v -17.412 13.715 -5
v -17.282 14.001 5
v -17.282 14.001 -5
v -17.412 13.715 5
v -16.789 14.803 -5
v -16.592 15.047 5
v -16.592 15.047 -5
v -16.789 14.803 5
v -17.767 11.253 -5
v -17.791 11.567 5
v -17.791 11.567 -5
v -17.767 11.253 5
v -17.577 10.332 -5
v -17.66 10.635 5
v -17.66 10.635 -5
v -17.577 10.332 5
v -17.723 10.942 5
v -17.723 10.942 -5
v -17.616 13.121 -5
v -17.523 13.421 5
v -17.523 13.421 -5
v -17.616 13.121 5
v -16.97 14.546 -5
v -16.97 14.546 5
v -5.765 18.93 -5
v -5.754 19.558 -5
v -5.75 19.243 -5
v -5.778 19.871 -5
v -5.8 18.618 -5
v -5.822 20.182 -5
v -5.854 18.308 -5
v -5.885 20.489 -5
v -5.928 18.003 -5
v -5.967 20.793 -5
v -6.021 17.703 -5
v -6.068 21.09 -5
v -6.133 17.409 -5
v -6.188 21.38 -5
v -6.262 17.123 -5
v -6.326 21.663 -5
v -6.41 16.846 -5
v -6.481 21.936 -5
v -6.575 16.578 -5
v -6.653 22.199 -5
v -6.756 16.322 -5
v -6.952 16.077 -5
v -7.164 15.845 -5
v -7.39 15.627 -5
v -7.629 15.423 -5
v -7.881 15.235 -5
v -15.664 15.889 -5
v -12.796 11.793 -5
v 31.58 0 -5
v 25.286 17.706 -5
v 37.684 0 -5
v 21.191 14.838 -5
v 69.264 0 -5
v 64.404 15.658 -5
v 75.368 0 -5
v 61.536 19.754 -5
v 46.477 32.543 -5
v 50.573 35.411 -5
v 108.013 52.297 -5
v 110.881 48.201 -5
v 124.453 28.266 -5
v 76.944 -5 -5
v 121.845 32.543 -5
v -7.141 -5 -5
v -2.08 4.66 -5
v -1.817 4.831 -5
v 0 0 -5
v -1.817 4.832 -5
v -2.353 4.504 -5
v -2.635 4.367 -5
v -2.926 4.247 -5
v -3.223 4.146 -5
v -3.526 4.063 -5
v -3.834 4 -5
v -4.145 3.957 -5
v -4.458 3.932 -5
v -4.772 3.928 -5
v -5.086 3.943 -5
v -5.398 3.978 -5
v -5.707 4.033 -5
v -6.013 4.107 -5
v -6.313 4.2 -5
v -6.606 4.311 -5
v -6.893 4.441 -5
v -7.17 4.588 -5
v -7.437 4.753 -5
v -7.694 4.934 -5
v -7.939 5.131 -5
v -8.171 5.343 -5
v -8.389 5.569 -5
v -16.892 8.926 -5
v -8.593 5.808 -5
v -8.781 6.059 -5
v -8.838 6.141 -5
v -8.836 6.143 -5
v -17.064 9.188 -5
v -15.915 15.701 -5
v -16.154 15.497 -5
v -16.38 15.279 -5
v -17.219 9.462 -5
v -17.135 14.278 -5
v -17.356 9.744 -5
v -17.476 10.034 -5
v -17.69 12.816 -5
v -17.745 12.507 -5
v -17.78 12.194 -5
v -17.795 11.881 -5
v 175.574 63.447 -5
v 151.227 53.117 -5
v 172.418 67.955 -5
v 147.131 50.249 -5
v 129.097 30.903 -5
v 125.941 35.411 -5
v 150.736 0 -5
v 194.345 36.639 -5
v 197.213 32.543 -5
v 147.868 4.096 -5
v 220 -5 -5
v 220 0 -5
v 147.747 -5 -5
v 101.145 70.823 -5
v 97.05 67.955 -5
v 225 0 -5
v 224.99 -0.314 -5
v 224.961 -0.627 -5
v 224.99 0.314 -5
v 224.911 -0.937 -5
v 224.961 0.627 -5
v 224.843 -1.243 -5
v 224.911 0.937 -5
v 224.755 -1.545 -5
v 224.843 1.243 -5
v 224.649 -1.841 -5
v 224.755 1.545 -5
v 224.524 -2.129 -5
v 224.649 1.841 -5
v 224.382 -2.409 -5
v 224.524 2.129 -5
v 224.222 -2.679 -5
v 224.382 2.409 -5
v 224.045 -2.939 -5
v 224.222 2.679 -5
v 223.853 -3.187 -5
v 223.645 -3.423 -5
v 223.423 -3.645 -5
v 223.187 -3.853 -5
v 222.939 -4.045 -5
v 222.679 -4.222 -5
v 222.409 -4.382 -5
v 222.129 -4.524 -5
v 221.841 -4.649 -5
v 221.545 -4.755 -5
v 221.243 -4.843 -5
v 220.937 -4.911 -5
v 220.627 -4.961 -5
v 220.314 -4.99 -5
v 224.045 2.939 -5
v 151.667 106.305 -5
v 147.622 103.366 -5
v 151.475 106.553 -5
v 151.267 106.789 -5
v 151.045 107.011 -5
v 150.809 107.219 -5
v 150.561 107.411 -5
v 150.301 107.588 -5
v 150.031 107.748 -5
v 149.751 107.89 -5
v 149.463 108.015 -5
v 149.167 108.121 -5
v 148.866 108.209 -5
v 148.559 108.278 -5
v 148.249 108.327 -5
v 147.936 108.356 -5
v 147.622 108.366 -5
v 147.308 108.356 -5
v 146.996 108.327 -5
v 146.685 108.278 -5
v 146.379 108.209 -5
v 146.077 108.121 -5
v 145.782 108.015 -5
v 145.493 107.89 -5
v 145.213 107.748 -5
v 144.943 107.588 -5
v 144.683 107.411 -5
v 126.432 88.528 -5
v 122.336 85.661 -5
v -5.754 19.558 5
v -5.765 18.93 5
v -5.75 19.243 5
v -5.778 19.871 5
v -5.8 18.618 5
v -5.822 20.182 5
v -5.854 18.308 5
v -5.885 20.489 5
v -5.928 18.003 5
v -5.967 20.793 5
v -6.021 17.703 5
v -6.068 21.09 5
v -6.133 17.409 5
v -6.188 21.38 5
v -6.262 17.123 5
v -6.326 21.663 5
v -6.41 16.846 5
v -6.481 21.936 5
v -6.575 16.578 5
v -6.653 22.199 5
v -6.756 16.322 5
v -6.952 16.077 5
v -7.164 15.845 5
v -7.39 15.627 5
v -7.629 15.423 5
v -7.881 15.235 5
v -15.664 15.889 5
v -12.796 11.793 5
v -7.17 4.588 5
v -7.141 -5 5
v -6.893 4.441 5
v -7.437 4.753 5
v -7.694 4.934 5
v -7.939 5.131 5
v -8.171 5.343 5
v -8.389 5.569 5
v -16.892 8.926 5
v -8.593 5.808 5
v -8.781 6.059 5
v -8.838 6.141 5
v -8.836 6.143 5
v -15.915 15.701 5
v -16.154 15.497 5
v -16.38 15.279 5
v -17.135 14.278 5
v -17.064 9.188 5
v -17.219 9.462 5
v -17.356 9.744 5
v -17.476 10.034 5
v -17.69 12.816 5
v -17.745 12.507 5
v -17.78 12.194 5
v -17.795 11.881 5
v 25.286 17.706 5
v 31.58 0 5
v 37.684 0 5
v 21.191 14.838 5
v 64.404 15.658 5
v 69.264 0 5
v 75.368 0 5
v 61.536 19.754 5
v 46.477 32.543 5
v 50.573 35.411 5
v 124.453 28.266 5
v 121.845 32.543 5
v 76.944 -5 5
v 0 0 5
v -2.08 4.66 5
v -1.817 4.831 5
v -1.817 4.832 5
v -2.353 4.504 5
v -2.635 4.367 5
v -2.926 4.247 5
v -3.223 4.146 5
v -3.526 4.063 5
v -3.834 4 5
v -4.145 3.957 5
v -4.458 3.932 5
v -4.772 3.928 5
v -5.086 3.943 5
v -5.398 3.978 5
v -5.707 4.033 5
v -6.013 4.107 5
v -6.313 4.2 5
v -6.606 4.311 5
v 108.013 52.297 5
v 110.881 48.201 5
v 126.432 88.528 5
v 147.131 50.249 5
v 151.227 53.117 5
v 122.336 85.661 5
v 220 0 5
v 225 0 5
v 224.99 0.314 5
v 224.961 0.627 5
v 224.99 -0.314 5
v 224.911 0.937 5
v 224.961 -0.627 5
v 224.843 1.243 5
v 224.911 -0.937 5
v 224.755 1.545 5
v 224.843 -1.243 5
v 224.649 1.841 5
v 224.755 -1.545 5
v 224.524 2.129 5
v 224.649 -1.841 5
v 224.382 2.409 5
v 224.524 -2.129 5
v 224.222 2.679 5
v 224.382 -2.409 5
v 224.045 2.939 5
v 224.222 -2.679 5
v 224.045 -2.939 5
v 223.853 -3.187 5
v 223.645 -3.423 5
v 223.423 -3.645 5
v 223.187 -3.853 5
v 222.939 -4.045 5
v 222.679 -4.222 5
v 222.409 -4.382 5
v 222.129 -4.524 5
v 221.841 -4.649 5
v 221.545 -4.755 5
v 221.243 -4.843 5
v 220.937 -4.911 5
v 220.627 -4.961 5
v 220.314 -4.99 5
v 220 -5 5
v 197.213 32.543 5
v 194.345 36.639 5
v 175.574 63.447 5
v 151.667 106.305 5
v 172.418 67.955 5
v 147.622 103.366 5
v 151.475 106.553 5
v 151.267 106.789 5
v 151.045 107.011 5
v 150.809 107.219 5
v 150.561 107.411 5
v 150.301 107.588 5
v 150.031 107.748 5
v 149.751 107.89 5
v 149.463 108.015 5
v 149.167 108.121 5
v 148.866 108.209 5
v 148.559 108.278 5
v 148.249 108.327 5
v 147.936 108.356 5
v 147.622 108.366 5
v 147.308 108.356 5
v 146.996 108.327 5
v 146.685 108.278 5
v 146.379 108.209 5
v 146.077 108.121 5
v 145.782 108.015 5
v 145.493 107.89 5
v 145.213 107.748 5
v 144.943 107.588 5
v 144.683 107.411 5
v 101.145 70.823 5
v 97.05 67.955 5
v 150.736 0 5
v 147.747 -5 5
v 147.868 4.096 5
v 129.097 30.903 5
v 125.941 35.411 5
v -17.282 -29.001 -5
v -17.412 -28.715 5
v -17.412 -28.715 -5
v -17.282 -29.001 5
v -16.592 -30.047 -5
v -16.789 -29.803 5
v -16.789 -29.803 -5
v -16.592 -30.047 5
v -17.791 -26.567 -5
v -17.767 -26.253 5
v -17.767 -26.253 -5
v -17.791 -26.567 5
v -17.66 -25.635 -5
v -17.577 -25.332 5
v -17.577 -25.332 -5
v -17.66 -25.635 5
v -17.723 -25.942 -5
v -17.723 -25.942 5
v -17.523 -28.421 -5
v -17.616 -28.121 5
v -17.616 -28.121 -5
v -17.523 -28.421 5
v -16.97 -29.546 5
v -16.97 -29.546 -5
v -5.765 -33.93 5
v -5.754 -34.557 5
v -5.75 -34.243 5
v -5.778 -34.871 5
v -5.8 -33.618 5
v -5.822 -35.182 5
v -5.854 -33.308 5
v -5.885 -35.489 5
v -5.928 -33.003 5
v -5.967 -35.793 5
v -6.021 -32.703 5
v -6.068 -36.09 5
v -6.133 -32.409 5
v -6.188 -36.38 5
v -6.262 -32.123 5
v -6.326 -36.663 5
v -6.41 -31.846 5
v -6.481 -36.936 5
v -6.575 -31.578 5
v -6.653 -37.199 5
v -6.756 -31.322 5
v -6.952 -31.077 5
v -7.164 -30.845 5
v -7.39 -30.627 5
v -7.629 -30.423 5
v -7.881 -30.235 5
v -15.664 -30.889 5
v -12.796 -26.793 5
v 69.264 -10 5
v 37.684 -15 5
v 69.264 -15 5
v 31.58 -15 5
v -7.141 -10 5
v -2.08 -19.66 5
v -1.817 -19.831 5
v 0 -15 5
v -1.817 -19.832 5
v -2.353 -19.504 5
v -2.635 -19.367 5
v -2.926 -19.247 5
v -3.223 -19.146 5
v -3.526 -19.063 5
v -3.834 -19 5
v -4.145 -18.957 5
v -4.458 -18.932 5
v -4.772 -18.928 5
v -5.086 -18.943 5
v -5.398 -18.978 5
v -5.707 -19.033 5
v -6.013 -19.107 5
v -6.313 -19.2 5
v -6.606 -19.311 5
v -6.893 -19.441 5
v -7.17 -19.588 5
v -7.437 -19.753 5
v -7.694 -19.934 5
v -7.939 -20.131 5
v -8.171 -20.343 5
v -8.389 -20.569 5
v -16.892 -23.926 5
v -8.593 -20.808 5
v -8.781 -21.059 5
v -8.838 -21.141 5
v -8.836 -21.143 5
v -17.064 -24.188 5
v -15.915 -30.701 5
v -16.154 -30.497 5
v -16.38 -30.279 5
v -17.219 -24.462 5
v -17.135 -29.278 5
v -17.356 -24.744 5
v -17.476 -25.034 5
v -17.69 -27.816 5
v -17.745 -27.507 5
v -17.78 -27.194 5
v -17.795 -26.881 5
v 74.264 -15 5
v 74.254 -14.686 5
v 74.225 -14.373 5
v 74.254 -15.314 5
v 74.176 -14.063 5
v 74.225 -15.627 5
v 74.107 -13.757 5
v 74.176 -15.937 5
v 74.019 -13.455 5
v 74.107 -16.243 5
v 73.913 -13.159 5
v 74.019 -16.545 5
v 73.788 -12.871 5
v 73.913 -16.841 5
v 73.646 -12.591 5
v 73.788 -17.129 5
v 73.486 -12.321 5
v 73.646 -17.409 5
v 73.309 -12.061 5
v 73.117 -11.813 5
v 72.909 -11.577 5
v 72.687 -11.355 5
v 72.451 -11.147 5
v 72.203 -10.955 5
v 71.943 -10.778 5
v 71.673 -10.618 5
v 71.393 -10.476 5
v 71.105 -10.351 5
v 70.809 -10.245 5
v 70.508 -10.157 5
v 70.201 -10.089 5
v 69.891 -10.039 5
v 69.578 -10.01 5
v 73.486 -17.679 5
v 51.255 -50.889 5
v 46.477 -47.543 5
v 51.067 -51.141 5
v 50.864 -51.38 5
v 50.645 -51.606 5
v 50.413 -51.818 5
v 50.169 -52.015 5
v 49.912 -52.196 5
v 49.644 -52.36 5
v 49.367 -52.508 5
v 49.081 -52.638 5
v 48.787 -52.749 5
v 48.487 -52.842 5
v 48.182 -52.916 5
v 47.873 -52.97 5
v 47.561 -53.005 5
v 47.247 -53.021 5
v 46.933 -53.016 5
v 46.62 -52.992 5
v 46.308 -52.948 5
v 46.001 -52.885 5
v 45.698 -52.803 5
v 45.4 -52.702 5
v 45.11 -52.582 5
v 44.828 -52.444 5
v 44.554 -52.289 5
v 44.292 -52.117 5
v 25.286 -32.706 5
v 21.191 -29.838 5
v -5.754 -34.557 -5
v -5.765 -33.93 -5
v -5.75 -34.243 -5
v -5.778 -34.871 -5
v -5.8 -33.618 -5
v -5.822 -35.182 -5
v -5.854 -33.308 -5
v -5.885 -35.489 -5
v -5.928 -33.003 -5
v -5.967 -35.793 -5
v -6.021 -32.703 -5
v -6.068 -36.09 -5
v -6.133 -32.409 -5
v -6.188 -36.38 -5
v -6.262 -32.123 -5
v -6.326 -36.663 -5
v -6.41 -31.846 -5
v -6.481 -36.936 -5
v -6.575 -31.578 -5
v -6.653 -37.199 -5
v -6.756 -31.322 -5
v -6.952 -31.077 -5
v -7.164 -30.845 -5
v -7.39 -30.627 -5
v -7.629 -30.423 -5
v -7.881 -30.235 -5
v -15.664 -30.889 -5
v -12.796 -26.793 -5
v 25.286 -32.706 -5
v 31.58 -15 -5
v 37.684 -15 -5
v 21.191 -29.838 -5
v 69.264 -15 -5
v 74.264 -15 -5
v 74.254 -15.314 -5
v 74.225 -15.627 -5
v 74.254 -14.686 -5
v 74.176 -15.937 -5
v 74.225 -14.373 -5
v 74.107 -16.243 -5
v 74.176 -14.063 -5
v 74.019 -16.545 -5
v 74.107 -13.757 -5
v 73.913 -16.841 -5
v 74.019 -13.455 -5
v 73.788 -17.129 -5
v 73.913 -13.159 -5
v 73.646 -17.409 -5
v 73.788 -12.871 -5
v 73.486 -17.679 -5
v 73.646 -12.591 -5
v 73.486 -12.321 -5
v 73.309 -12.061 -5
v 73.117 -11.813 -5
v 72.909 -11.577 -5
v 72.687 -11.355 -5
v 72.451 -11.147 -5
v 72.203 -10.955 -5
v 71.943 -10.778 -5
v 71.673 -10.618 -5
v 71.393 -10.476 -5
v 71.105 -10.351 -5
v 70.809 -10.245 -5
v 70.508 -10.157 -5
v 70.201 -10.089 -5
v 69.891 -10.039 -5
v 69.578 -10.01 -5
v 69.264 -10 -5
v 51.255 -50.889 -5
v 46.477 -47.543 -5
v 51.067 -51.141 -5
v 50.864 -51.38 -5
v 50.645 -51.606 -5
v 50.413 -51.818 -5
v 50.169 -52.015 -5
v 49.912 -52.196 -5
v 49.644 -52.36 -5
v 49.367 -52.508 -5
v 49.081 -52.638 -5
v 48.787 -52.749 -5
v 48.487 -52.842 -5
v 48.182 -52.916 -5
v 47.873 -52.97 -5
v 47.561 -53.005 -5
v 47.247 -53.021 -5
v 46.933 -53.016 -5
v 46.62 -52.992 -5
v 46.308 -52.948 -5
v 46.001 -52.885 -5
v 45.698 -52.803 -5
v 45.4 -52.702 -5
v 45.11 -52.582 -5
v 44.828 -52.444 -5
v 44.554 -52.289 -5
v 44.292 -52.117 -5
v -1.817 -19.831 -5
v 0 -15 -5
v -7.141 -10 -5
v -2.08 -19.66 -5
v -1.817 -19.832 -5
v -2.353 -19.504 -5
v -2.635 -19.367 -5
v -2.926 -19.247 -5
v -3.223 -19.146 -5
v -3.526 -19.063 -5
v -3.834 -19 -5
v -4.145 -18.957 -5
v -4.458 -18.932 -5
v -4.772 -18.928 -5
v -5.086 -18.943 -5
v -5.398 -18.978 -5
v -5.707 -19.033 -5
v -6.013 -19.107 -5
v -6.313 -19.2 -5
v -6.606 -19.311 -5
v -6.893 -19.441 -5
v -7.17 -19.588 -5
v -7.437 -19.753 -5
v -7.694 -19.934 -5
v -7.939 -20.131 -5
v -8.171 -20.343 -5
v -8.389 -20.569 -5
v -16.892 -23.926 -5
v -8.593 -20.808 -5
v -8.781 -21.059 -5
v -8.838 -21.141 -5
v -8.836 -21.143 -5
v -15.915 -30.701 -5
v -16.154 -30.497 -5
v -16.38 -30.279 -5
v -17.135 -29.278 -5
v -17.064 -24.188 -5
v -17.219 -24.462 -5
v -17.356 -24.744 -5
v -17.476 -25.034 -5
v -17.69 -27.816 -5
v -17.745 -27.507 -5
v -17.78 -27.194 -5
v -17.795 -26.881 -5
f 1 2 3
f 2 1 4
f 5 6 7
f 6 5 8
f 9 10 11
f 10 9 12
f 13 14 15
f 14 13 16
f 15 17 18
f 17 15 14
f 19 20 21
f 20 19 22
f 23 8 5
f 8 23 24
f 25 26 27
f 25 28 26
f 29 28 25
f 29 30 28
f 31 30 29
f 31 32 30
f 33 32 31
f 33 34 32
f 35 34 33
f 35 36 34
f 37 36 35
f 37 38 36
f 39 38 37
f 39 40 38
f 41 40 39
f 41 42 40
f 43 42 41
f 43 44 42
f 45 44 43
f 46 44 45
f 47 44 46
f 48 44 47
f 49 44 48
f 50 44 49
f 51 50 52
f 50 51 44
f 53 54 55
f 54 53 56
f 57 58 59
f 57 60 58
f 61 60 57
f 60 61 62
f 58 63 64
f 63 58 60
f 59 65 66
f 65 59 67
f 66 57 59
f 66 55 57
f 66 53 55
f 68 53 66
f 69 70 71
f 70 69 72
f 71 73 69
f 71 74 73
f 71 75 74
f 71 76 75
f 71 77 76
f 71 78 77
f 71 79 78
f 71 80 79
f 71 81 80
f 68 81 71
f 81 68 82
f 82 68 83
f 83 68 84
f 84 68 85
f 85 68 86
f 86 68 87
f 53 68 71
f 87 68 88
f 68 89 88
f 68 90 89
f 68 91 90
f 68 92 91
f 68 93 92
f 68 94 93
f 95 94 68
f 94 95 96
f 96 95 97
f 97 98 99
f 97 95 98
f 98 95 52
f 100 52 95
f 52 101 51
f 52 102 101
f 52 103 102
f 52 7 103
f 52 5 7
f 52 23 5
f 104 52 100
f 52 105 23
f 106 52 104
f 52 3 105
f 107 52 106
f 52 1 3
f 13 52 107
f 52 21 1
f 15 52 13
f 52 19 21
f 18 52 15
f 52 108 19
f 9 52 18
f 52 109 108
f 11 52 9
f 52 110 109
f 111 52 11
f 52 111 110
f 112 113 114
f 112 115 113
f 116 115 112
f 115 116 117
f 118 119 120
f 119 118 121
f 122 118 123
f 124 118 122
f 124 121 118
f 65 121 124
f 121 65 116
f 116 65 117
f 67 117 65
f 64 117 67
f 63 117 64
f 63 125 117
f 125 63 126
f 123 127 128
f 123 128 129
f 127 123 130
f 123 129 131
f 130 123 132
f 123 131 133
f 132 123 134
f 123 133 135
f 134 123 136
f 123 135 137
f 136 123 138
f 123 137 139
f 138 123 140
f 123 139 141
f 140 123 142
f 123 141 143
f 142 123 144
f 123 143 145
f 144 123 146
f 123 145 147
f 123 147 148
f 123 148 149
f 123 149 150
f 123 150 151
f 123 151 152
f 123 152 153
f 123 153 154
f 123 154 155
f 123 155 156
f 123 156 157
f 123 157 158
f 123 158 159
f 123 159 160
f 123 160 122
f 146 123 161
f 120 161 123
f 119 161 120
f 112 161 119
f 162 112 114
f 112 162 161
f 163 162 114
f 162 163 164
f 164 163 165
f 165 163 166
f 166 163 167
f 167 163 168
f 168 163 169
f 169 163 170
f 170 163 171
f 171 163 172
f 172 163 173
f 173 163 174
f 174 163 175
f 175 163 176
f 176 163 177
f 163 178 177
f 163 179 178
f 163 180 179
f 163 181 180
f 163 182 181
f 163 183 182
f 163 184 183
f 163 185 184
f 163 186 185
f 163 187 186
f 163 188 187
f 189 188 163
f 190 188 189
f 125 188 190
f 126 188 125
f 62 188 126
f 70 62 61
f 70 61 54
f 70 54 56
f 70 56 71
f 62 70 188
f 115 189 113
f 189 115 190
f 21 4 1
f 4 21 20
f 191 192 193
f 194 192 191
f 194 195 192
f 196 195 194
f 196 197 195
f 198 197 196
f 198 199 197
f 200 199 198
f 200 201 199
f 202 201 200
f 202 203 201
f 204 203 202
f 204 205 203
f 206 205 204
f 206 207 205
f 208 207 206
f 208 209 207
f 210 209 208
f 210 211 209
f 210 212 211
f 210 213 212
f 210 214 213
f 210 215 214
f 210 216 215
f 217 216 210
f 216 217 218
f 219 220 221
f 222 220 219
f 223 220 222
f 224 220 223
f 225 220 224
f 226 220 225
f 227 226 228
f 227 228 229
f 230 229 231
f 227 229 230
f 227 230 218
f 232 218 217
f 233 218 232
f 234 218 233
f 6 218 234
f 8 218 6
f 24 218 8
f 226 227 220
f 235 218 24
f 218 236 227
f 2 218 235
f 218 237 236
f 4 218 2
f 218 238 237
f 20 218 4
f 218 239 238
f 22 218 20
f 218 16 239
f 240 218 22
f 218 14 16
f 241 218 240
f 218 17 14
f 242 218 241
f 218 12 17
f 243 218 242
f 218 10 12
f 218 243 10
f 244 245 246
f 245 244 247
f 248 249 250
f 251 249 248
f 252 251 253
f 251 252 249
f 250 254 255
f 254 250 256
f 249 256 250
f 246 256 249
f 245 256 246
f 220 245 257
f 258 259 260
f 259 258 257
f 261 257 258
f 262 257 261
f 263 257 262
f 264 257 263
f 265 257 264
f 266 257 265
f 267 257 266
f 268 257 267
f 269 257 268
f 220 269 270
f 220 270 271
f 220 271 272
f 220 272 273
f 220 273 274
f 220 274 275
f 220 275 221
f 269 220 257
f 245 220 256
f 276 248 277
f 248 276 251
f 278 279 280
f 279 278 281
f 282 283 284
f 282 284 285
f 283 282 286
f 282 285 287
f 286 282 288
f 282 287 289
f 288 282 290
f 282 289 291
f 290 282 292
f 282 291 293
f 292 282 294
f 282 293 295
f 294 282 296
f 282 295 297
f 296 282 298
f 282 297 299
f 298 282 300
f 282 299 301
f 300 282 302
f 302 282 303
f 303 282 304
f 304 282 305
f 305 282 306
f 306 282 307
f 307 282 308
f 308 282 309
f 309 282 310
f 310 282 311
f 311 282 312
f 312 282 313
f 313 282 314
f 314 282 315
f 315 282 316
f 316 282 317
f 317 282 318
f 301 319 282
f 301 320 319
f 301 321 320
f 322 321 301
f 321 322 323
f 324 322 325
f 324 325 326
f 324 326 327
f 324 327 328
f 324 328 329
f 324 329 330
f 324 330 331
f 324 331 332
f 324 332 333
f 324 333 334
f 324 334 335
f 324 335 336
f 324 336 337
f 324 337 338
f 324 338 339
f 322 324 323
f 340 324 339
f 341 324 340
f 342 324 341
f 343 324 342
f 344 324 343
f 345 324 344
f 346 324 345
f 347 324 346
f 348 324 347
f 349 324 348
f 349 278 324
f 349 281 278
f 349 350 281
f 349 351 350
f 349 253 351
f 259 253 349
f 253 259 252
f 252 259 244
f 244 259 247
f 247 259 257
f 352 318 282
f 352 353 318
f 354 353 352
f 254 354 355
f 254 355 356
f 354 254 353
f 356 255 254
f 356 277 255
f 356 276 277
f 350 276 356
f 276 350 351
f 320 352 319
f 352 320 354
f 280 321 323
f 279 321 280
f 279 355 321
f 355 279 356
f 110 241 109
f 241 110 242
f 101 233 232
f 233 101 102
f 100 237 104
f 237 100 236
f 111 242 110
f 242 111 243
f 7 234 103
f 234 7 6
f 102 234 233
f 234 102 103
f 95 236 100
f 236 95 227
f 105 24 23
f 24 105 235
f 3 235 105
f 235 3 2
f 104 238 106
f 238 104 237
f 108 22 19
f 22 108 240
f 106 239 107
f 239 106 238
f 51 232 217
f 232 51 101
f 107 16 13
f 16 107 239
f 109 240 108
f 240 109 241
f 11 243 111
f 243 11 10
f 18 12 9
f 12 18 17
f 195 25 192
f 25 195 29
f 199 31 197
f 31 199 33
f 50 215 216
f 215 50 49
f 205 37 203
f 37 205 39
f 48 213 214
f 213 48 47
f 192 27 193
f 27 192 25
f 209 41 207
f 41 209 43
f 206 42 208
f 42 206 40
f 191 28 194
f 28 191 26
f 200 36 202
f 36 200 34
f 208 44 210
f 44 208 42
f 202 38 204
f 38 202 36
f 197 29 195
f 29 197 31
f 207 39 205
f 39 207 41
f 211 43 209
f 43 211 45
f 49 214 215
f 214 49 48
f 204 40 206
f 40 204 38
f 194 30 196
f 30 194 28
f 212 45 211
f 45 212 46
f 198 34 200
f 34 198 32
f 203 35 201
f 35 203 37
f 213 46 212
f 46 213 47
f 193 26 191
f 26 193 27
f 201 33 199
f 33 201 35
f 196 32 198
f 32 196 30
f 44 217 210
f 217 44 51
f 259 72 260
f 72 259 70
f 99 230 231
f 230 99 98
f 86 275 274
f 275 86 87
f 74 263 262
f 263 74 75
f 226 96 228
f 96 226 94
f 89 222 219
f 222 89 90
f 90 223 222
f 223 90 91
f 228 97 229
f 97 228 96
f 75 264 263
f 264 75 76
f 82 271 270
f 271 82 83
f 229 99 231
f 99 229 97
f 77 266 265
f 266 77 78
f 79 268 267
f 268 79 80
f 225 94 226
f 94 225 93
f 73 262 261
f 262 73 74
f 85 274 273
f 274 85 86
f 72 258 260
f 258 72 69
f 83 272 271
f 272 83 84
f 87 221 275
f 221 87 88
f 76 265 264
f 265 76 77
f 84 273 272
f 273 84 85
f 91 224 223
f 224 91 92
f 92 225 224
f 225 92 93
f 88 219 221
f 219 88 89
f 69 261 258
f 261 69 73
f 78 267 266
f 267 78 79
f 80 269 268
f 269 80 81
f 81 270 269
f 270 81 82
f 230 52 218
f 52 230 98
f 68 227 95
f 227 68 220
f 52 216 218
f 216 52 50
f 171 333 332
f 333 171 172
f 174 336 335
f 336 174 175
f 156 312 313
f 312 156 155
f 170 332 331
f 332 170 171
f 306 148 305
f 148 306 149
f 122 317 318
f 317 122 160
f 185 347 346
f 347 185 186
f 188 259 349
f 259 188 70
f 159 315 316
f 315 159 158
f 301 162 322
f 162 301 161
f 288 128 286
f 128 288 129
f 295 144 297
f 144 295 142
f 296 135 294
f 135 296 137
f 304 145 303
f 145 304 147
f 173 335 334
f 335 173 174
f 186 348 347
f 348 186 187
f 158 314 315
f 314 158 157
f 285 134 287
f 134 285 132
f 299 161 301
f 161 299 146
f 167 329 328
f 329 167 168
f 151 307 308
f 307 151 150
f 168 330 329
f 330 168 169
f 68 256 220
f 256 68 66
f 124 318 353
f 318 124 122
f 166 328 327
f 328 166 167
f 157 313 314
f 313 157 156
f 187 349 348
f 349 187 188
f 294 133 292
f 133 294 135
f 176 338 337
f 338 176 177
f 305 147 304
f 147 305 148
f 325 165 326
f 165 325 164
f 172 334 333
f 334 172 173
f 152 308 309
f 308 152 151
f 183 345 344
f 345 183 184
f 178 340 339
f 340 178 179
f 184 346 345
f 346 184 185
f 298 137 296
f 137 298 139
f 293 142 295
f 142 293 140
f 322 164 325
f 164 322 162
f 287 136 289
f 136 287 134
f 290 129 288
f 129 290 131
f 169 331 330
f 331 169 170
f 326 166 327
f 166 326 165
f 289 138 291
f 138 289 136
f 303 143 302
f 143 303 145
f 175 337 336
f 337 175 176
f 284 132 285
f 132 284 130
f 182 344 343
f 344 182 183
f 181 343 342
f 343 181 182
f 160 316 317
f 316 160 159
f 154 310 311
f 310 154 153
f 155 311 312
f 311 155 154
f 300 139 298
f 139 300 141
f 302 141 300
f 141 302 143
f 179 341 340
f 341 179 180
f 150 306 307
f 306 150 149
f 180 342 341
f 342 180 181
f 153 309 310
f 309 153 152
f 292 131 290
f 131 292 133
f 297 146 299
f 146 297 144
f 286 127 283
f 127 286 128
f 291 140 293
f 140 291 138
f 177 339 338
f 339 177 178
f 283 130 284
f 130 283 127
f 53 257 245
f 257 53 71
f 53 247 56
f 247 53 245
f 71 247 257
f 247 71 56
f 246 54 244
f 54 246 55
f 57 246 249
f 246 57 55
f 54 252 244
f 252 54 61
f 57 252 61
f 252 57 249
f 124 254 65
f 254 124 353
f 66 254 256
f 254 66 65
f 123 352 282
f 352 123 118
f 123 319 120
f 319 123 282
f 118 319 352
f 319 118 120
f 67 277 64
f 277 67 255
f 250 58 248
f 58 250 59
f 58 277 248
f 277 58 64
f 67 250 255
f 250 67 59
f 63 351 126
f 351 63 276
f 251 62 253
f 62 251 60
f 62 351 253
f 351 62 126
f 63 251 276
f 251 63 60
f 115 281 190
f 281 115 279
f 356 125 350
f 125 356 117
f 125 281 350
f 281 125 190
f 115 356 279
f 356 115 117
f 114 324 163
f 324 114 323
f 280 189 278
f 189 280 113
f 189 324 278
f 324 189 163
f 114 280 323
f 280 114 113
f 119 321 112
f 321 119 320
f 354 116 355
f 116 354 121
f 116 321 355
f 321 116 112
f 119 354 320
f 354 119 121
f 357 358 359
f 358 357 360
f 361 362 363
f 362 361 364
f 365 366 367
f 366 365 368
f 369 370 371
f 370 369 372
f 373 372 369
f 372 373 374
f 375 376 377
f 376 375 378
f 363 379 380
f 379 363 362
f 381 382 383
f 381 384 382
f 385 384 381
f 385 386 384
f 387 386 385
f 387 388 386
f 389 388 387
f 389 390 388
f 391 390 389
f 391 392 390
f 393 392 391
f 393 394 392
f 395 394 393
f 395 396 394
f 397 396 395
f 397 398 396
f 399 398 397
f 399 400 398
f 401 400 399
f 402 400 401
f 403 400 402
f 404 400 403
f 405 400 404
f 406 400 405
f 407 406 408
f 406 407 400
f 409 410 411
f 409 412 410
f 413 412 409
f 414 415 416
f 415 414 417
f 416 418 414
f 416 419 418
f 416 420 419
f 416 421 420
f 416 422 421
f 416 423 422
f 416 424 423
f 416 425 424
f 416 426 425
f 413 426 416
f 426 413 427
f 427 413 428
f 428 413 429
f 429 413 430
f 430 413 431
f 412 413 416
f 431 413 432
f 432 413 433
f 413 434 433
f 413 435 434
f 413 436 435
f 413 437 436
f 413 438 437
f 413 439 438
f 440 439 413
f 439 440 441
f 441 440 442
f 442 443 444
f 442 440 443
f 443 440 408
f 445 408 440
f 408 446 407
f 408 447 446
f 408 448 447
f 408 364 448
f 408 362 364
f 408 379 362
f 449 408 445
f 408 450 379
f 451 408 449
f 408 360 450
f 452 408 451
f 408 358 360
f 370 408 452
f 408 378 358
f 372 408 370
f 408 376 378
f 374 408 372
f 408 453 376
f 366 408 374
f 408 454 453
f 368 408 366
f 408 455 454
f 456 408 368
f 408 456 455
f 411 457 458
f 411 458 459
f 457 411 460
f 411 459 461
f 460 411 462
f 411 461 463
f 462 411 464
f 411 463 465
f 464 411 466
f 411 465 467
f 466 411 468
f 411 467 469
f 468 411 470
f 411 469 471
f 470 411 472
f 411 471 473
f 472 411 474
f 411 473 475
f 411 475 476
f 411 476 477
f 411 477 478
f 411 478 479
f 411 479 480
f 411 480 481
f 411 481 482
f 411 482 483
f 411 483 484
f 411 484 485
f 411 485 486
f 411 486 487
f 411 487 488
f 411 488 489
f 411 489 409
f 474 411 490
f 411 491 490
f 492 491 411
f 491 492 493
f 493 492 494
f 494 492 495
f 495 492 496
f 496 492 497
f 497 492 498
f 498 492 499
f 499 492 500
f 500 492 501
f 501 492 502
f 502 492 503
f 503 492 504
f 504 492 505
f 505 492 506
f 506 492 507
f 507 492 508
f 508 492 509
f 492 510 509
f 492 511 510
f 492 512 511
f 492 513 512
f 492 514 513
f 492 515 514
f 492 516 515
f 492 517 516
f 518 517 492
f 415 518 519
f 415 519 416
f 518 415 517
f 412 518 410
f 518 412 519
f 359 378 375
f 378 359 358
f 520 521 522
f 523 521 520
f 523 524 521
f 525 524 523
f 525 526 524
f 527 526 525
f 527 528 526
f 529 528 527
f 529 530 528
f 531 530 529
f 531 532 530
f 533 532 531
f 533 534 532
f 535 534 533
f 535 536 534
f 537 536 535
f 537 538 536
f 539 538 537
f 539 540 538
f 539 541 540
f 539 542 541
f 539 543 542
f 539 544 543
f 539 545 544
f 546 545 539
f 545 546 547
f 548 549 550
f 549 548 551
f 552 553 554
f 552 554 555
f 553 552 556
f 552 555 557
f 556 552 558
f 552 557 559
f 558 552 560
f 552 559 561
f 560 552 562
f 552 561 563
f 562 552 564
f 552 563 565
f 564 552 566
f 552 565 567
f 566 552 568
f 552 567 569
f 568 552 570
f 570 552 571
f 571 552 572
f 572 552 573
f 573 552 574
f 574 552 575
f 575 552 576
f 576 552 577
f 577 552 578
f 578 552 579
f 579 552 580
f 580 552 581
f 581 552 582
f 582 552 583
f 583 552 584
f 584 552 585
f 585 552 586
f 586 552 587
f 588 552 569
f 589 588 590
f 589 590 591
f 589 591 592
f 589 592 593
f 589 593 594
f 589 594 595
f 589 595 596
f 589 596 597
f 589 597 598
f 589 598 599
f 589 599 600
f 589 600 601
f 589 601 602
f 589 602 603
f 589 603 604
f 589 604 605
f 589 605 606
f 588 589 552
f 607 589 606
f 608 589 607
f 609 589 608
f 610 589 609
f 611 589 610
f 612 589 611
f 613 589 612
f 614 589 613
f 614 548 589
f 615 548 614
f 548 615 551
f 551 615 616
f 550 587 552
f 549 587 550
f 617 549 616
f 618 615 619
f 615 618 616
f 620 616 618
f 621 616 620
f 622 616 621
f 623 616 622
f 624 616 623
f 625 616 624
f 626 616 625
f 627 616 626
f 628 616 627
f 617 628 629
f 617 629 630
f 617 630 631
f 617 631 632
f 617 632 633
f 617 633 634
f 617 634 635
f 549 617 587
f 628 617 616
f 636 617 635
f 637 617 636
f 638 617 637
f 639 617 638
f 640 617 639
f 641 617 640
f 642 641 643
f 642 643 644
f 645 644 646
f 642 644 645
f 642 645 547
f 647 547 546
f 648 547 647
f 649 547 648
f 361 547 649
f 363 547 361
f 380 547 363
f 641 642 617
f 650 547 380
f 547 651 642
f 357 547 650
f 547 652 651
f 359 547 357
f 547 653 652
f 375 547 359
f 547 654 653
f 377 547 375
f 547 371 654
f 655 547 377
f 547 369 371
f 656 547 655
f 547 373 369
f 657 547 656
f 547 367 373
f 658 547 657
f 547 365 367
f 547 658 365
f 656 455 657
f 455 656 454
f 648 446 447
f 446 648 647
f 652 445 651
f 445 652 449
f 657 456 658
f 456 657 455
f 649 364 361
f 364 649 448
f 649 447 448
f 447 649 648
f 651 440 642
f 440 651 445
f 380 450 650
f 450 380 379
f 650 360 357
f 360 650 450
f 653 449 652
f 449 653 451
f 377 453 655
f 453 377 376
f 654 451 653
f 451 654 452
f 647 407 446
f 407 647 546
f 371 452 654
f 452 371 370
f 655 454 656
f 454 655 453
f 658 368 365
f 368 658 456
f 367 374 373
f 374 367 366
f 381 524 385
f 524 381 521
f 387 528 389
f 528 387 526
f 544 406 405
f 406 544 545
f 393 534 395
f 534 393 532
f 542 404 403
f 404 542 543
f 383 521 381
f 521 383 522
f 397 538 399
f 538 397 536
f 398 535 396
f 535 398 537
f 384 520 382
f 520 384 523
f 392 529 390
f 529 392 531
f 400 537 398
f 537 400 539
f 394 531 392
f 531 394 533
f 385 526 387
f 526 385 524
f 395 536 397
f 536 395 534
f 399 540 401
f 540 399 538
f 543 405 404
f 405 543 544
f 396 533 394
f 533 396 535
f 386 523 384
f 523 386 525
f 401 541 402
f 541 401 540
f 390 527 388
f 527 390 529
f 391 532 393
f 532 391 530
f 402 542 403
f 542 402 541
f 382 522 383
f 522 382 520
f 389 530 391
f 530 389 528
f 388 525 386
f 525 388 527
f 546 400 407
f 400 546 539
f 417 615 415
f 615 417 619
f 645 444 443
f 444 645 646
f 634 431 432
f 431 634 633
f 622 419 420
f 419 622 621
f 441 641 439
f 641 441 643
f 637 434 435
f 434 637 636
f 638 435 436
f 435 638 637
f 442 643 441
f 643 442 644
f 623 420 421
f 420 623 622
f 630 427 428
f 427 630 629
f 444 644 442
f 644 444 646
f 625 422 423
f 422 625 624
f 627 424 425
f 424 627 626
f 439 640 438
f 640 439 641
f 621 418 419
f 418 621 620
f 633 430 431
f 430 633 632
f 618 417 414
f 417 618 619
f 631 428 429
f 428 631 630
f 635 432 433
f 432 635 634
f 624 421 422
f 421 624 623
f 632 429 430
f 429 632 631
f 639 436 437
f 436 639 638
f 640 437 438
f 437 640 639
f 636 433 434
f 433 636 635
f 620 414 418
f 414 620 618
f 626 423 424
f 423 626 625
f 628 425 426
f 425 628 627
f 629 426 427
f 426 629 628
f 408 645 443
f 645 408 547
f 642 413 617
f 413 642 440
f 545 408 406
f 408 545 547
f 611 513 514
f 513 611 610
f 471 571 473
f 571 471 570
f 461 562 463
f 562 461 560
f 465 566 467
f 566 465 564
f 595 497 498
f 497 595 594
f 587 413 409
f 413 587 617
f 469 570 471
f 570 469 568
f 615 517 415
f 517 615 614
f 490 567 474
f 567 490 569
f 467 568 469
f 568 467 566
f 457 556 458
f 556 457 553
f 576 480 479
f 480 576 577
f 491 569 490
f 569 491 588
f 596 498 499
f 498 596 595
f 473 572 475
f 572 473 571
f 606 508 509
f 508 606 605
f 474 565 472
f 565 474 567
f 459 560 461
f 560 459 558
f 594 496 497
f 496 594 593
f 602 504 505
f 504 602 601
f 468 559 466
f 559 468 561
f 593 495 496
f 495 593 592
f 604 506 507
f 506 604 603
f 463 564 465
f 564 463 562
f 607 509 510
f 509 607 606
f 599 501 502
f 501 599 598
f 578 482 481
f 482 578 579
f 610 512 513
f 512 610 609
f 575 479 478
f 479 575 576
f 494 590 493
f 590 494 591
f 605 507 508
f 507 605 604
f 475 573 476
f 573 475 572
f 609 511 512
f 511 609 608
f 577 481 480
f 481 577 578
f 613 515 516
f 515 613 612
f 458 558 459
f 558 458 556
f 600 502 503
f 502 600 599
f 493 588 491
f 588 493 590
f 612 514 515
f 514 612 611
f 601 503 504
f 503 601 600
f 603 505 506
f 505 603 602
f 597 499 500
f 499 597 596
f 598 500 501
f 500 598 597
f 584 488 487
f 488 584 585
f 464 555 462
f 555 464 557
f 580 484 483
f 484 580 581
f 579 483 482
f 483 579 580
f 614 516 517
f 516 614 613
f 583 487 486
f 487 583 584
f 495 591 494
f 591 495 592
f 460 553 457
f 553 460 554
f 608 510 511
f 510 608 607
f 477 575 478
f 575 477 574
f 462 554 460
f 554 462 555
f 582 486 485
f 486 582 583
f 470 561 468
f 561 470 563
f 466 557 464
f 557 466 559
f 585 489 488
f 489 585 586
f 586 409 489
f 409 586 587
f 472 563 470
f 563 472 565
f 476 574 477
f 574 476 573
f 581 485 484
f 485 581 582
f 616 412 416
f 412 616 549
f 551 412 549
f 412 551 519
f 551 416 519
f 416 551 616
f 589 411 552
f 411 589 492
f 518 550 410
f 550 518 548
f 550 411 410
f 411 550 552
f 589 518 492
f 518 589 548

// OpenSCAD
//resolution
$fn=100;

//Wall thickness (mm)
wallThick = 5;  // [2:8]

//Angle (Deg)
angleDeg = 35;  // [15:50]

//Deepnes of the base(mm)
baseDeep = 220; // 

//Width of the Stand(mm)
standWidth = 10;// [2:20]

//Spacing of the Hook(mm)
hookSpace = 12; // [5:20]

// Length of the Hook(mm). Zero = No Hook
hookLen = 6;   // [30]

/* [Hidden] */
fudge = 0.1;    //0.1

subDivs = 6;

surfaceLen = cos(angleDeg) * baseDeep;

topXCord = pow(surfaceLen,2)/baseDeep;
topYCord = sqrt((baseDeep-topXCord)*topXCord);

fieldWdth = (surfaceLen-(subDivs-1)*wallThick)/subDivs;
echo(surfaceLen,fieldWdth);
echo(norm([ 144.02, 100.45, 5.00 ]));

// triangle calculations
// tan alpha = GK/AK
// cos alpha = AK/HYP
// sin alpha = GK/HYP
// b²=c*q
// a²+b²=c²
dFieldWdth = fieldWdth*2+wallThick; //double field width (adjactence side)
GK = tan(angleDeg)*fieldWdth; //opposite width of triangle to remove

dGK = tan(angleDeg)* dFieldWdth; //opposite width of the large triangle
dAK = dFieldWdth;
dHYP = dGK / sin(angleDeg); //hypotenuse width of large triangle

HYP1 = sqrt(pow(fieldWdth,2)+pow(GK,2)); //The hypotenuse of the triangle to remove
HYP2 = wallThick / cos(angleDeg);  //the hypotenuse of the small wall base, width to next triangle
GK2 = sqrt(pow(HYP2,2)-pow(wallThick,2)); //opposite width of the small tri at the base f the wall
GK3 = sin(angleDeg)*wallThick; //opposite width of small tri at the rightmost triangle
AK3 = cos(angleDeg)*wallThick;

GK4 = wallThick-AK3+fudge; //very small Tri at opener
HYP4 = GK4/sin(angleDeg);
AK4 = cos(angleDeg) * HYP4;

AK5 = GK4;
HYP5 = AK5/cos(angleDeg);

Hg = sin(angleDeg)*dFieldWdth;
q = Hg+wallThick/tan(angleDeg);
echo(GK3);
    

//base geometry
//big one
difference(){
union(){
    hull(){
        cylinder(h=standWidth,r=wallThick, center=true);
        translate ([baseDeep,0,0]) 
            cylinder(h=standWidth,r=wallThick, center=true);
        translate ([topXCord,topYCord,0]) 
            cylinder(h=standWidth,r=wallThick, center=true);
    }

    //get translation for the hook in X dir
    AK=wallThick/tan(angleDeg);

    translate([-AK,-wallThick,-standWidth/2])
        rotate([0,0,angleDeg])       
            hook();
    translate([-AK,-wallThick,-standWidth/2]) 
        cube([AK,wallThick,standWidth]);
}


// now the recesses 
//polys
    //#1
    rotate([0,0,angleDeg]) linear_extrude(height=standWidth+fudge,center=true) polygon([[0,0],[fieldWdth,0],[fieldWdth,-GK]]);
    //#2 (tri+quad)
    translate ([HYP1+HYP2,0,0]) 
        rotate([0,0,angleDeg]) 
        linear_extrude(height=standWidth+fudge,center=true) 
            polygon([[0,0],[0,GK+GK2],[fieldWdth,GK+GK2],[fieldWdth,0],[fieldWdth,-GK]]);
    //#3 (double, opens at bottom)
    //#translate ([(HYP1+HYP2)*2+GK3,-AK3,0]) 
    translate ([(HYP1+HYP2)*2+GK3-AK4,-wallThick-fudge,0]) 
        rotate([0,0,angleDeg]) 
        linear_extrude(height=standWidth+fudge,center=true) 
            polygon([[0,0],[dFieldWdth+AK4,0],[dFieldWdth+AK4,-dGK-HYP5]]);

    //#4 (double)
    translate ([(HYP1+HYP2)*4,0,0]) rotate([0,0,angleDeg]) 
        linear_extrude(height=standWidth+fudge,center=true) 
            polygon([[0,0],[dFieldWdth,0],[dFieldWdth,-dGK]]);
            
//now the rectangles
    recDepth2=2*(GK+GK2);
    //#1
    translate([(HYP1+HYP2)*2,0,-(standWidth+fudge)/2])
        rotate([0,0,angleDeg]) cube([dFieldWdth,(recDepth2-wallThick)/2,standWidth+fudge]);
    //#2
    translate([(HYP1+HYP2)*2,0,-(standWidth+fudge)/2])
        rotate([0,0,angleDeg]) 
            translate([0,(recDepth2-wallThick)/2+wallThick,0])cube([dFieldWdth,(recDepth2-wallThick)/2,standWidth+fudge]);
    //#3
    translate([(HYP1+HYP2)*4,0,-(standWidth+fudge)/2])rotate([0,0,angleDeg]) 
        translate([0,dGK+GK2,0])cube([fieldWdth,recDepth2,standWidth+fudge]);
        
 
    //#4
    translate([(HYP1+HYP2)*5,0,-(standWidth+fudge)/2])rotate([0,0,angleDeg]) 
        translate([0,dGK+GK2+GK+GK2,0])cube([fieldWdth,recDepth2,standWidth+fudge,]);
        
    //#5
    translate([(HYP1+HYP2)*4-GK3,AK3,-(standWidth+fudge)/2]) rotate([0,0,angleDeg]) 
        translate([0,0,0])cube([fieldWdth*2+wallThick,2*GK-GK2,standWidth+fudge,]);
   
    
}
// the small one
translate([0,-wallThick*3,0])
rotate([180,0,0])
    difference(){
        union(){
            hull(){
                cylinder(h=standWidth,r=wallThick, center=true);
                translate ([2*HYP1+HYP2,0,0]) 
                    cylinder(h=standWidth,r=wallThick, center=true);
                rotate([0,0,angleDeg])
                translate ([surfaceLen*(2/subDivs)-wallThick/2,0,0]) 
                    cylinder(h=standWidth,r=wallThick, center=true);
            }

            //get translation for the hook in X dir
            AK=wallThick/tan(angleDeg);

            translate([-AK,-wallThick,-standWidth/2])
                rotate([0,0,angleDeg])       
                    hook();
            translate([-AK,-wallThick,-standWidth/2]) 
                cube([AK,wallThick,standWidth]);
        }
        //#1
        rotate([0,0,angleDeg]) linear_extrude(height=standWidth+fudge,center=true) polygon([[0,0],[fieldWdth,0],[fieldWdth,-GK]]);
        
        //#2 (tri+quad)
        translate ([HYP1+HYP2,0,0]) 
            rotate([0,0,angleDeg]) 
            linear_extrude(height=standWidth+fudge,center=true) 
                polygon([[0,0],[0,GK+GK2],[fieldWdth,GK+GK2],[fieldWdth,0],[fieldWdth,-GK]]);
    }


module hook(){

    union(){
        cube([wallThick,hookSpace+wallThick,standWidth]);
        translate([wallThick,hookSpace+wallThick,0])
            intersection(){
                cylinder(h=standWidth,r=wallThick, center=false);
                translate([-wallThick-fudge,0,-fudge/2]) cube([wallThick+fudge,wallThick+fudge,standWidth+fudge]);
            }
        if (hookLen) translate([wallThick,hookSpace+wallThick,0]) cube([hookLen,wallThick,standWidth]);
        if (hookLen) translate([wallThick+hookLen,hookSpace+wallThick*2,0]) 
            intersection(){
            cylinder(h=standWidth,r=wallThick, center=false);
                translate([0,-wallThick-fudge,-fudge/2]) cube([wallThick+fudge,wallThick+fudge,standWidth+fudge]);
            }
        translate([wallThick*2,2*wallThick,0]) 
            difference(){
                translate([-wallThick-fudge,-2*wallThick,0]) cube([wallThick+fudge,2*wallThick+fudge,standWidth]);
                translate([0,0,-fudge/2]) cylinder(h=standWidth+fudge,r=wallThick, center=false);
            }
    }
}
